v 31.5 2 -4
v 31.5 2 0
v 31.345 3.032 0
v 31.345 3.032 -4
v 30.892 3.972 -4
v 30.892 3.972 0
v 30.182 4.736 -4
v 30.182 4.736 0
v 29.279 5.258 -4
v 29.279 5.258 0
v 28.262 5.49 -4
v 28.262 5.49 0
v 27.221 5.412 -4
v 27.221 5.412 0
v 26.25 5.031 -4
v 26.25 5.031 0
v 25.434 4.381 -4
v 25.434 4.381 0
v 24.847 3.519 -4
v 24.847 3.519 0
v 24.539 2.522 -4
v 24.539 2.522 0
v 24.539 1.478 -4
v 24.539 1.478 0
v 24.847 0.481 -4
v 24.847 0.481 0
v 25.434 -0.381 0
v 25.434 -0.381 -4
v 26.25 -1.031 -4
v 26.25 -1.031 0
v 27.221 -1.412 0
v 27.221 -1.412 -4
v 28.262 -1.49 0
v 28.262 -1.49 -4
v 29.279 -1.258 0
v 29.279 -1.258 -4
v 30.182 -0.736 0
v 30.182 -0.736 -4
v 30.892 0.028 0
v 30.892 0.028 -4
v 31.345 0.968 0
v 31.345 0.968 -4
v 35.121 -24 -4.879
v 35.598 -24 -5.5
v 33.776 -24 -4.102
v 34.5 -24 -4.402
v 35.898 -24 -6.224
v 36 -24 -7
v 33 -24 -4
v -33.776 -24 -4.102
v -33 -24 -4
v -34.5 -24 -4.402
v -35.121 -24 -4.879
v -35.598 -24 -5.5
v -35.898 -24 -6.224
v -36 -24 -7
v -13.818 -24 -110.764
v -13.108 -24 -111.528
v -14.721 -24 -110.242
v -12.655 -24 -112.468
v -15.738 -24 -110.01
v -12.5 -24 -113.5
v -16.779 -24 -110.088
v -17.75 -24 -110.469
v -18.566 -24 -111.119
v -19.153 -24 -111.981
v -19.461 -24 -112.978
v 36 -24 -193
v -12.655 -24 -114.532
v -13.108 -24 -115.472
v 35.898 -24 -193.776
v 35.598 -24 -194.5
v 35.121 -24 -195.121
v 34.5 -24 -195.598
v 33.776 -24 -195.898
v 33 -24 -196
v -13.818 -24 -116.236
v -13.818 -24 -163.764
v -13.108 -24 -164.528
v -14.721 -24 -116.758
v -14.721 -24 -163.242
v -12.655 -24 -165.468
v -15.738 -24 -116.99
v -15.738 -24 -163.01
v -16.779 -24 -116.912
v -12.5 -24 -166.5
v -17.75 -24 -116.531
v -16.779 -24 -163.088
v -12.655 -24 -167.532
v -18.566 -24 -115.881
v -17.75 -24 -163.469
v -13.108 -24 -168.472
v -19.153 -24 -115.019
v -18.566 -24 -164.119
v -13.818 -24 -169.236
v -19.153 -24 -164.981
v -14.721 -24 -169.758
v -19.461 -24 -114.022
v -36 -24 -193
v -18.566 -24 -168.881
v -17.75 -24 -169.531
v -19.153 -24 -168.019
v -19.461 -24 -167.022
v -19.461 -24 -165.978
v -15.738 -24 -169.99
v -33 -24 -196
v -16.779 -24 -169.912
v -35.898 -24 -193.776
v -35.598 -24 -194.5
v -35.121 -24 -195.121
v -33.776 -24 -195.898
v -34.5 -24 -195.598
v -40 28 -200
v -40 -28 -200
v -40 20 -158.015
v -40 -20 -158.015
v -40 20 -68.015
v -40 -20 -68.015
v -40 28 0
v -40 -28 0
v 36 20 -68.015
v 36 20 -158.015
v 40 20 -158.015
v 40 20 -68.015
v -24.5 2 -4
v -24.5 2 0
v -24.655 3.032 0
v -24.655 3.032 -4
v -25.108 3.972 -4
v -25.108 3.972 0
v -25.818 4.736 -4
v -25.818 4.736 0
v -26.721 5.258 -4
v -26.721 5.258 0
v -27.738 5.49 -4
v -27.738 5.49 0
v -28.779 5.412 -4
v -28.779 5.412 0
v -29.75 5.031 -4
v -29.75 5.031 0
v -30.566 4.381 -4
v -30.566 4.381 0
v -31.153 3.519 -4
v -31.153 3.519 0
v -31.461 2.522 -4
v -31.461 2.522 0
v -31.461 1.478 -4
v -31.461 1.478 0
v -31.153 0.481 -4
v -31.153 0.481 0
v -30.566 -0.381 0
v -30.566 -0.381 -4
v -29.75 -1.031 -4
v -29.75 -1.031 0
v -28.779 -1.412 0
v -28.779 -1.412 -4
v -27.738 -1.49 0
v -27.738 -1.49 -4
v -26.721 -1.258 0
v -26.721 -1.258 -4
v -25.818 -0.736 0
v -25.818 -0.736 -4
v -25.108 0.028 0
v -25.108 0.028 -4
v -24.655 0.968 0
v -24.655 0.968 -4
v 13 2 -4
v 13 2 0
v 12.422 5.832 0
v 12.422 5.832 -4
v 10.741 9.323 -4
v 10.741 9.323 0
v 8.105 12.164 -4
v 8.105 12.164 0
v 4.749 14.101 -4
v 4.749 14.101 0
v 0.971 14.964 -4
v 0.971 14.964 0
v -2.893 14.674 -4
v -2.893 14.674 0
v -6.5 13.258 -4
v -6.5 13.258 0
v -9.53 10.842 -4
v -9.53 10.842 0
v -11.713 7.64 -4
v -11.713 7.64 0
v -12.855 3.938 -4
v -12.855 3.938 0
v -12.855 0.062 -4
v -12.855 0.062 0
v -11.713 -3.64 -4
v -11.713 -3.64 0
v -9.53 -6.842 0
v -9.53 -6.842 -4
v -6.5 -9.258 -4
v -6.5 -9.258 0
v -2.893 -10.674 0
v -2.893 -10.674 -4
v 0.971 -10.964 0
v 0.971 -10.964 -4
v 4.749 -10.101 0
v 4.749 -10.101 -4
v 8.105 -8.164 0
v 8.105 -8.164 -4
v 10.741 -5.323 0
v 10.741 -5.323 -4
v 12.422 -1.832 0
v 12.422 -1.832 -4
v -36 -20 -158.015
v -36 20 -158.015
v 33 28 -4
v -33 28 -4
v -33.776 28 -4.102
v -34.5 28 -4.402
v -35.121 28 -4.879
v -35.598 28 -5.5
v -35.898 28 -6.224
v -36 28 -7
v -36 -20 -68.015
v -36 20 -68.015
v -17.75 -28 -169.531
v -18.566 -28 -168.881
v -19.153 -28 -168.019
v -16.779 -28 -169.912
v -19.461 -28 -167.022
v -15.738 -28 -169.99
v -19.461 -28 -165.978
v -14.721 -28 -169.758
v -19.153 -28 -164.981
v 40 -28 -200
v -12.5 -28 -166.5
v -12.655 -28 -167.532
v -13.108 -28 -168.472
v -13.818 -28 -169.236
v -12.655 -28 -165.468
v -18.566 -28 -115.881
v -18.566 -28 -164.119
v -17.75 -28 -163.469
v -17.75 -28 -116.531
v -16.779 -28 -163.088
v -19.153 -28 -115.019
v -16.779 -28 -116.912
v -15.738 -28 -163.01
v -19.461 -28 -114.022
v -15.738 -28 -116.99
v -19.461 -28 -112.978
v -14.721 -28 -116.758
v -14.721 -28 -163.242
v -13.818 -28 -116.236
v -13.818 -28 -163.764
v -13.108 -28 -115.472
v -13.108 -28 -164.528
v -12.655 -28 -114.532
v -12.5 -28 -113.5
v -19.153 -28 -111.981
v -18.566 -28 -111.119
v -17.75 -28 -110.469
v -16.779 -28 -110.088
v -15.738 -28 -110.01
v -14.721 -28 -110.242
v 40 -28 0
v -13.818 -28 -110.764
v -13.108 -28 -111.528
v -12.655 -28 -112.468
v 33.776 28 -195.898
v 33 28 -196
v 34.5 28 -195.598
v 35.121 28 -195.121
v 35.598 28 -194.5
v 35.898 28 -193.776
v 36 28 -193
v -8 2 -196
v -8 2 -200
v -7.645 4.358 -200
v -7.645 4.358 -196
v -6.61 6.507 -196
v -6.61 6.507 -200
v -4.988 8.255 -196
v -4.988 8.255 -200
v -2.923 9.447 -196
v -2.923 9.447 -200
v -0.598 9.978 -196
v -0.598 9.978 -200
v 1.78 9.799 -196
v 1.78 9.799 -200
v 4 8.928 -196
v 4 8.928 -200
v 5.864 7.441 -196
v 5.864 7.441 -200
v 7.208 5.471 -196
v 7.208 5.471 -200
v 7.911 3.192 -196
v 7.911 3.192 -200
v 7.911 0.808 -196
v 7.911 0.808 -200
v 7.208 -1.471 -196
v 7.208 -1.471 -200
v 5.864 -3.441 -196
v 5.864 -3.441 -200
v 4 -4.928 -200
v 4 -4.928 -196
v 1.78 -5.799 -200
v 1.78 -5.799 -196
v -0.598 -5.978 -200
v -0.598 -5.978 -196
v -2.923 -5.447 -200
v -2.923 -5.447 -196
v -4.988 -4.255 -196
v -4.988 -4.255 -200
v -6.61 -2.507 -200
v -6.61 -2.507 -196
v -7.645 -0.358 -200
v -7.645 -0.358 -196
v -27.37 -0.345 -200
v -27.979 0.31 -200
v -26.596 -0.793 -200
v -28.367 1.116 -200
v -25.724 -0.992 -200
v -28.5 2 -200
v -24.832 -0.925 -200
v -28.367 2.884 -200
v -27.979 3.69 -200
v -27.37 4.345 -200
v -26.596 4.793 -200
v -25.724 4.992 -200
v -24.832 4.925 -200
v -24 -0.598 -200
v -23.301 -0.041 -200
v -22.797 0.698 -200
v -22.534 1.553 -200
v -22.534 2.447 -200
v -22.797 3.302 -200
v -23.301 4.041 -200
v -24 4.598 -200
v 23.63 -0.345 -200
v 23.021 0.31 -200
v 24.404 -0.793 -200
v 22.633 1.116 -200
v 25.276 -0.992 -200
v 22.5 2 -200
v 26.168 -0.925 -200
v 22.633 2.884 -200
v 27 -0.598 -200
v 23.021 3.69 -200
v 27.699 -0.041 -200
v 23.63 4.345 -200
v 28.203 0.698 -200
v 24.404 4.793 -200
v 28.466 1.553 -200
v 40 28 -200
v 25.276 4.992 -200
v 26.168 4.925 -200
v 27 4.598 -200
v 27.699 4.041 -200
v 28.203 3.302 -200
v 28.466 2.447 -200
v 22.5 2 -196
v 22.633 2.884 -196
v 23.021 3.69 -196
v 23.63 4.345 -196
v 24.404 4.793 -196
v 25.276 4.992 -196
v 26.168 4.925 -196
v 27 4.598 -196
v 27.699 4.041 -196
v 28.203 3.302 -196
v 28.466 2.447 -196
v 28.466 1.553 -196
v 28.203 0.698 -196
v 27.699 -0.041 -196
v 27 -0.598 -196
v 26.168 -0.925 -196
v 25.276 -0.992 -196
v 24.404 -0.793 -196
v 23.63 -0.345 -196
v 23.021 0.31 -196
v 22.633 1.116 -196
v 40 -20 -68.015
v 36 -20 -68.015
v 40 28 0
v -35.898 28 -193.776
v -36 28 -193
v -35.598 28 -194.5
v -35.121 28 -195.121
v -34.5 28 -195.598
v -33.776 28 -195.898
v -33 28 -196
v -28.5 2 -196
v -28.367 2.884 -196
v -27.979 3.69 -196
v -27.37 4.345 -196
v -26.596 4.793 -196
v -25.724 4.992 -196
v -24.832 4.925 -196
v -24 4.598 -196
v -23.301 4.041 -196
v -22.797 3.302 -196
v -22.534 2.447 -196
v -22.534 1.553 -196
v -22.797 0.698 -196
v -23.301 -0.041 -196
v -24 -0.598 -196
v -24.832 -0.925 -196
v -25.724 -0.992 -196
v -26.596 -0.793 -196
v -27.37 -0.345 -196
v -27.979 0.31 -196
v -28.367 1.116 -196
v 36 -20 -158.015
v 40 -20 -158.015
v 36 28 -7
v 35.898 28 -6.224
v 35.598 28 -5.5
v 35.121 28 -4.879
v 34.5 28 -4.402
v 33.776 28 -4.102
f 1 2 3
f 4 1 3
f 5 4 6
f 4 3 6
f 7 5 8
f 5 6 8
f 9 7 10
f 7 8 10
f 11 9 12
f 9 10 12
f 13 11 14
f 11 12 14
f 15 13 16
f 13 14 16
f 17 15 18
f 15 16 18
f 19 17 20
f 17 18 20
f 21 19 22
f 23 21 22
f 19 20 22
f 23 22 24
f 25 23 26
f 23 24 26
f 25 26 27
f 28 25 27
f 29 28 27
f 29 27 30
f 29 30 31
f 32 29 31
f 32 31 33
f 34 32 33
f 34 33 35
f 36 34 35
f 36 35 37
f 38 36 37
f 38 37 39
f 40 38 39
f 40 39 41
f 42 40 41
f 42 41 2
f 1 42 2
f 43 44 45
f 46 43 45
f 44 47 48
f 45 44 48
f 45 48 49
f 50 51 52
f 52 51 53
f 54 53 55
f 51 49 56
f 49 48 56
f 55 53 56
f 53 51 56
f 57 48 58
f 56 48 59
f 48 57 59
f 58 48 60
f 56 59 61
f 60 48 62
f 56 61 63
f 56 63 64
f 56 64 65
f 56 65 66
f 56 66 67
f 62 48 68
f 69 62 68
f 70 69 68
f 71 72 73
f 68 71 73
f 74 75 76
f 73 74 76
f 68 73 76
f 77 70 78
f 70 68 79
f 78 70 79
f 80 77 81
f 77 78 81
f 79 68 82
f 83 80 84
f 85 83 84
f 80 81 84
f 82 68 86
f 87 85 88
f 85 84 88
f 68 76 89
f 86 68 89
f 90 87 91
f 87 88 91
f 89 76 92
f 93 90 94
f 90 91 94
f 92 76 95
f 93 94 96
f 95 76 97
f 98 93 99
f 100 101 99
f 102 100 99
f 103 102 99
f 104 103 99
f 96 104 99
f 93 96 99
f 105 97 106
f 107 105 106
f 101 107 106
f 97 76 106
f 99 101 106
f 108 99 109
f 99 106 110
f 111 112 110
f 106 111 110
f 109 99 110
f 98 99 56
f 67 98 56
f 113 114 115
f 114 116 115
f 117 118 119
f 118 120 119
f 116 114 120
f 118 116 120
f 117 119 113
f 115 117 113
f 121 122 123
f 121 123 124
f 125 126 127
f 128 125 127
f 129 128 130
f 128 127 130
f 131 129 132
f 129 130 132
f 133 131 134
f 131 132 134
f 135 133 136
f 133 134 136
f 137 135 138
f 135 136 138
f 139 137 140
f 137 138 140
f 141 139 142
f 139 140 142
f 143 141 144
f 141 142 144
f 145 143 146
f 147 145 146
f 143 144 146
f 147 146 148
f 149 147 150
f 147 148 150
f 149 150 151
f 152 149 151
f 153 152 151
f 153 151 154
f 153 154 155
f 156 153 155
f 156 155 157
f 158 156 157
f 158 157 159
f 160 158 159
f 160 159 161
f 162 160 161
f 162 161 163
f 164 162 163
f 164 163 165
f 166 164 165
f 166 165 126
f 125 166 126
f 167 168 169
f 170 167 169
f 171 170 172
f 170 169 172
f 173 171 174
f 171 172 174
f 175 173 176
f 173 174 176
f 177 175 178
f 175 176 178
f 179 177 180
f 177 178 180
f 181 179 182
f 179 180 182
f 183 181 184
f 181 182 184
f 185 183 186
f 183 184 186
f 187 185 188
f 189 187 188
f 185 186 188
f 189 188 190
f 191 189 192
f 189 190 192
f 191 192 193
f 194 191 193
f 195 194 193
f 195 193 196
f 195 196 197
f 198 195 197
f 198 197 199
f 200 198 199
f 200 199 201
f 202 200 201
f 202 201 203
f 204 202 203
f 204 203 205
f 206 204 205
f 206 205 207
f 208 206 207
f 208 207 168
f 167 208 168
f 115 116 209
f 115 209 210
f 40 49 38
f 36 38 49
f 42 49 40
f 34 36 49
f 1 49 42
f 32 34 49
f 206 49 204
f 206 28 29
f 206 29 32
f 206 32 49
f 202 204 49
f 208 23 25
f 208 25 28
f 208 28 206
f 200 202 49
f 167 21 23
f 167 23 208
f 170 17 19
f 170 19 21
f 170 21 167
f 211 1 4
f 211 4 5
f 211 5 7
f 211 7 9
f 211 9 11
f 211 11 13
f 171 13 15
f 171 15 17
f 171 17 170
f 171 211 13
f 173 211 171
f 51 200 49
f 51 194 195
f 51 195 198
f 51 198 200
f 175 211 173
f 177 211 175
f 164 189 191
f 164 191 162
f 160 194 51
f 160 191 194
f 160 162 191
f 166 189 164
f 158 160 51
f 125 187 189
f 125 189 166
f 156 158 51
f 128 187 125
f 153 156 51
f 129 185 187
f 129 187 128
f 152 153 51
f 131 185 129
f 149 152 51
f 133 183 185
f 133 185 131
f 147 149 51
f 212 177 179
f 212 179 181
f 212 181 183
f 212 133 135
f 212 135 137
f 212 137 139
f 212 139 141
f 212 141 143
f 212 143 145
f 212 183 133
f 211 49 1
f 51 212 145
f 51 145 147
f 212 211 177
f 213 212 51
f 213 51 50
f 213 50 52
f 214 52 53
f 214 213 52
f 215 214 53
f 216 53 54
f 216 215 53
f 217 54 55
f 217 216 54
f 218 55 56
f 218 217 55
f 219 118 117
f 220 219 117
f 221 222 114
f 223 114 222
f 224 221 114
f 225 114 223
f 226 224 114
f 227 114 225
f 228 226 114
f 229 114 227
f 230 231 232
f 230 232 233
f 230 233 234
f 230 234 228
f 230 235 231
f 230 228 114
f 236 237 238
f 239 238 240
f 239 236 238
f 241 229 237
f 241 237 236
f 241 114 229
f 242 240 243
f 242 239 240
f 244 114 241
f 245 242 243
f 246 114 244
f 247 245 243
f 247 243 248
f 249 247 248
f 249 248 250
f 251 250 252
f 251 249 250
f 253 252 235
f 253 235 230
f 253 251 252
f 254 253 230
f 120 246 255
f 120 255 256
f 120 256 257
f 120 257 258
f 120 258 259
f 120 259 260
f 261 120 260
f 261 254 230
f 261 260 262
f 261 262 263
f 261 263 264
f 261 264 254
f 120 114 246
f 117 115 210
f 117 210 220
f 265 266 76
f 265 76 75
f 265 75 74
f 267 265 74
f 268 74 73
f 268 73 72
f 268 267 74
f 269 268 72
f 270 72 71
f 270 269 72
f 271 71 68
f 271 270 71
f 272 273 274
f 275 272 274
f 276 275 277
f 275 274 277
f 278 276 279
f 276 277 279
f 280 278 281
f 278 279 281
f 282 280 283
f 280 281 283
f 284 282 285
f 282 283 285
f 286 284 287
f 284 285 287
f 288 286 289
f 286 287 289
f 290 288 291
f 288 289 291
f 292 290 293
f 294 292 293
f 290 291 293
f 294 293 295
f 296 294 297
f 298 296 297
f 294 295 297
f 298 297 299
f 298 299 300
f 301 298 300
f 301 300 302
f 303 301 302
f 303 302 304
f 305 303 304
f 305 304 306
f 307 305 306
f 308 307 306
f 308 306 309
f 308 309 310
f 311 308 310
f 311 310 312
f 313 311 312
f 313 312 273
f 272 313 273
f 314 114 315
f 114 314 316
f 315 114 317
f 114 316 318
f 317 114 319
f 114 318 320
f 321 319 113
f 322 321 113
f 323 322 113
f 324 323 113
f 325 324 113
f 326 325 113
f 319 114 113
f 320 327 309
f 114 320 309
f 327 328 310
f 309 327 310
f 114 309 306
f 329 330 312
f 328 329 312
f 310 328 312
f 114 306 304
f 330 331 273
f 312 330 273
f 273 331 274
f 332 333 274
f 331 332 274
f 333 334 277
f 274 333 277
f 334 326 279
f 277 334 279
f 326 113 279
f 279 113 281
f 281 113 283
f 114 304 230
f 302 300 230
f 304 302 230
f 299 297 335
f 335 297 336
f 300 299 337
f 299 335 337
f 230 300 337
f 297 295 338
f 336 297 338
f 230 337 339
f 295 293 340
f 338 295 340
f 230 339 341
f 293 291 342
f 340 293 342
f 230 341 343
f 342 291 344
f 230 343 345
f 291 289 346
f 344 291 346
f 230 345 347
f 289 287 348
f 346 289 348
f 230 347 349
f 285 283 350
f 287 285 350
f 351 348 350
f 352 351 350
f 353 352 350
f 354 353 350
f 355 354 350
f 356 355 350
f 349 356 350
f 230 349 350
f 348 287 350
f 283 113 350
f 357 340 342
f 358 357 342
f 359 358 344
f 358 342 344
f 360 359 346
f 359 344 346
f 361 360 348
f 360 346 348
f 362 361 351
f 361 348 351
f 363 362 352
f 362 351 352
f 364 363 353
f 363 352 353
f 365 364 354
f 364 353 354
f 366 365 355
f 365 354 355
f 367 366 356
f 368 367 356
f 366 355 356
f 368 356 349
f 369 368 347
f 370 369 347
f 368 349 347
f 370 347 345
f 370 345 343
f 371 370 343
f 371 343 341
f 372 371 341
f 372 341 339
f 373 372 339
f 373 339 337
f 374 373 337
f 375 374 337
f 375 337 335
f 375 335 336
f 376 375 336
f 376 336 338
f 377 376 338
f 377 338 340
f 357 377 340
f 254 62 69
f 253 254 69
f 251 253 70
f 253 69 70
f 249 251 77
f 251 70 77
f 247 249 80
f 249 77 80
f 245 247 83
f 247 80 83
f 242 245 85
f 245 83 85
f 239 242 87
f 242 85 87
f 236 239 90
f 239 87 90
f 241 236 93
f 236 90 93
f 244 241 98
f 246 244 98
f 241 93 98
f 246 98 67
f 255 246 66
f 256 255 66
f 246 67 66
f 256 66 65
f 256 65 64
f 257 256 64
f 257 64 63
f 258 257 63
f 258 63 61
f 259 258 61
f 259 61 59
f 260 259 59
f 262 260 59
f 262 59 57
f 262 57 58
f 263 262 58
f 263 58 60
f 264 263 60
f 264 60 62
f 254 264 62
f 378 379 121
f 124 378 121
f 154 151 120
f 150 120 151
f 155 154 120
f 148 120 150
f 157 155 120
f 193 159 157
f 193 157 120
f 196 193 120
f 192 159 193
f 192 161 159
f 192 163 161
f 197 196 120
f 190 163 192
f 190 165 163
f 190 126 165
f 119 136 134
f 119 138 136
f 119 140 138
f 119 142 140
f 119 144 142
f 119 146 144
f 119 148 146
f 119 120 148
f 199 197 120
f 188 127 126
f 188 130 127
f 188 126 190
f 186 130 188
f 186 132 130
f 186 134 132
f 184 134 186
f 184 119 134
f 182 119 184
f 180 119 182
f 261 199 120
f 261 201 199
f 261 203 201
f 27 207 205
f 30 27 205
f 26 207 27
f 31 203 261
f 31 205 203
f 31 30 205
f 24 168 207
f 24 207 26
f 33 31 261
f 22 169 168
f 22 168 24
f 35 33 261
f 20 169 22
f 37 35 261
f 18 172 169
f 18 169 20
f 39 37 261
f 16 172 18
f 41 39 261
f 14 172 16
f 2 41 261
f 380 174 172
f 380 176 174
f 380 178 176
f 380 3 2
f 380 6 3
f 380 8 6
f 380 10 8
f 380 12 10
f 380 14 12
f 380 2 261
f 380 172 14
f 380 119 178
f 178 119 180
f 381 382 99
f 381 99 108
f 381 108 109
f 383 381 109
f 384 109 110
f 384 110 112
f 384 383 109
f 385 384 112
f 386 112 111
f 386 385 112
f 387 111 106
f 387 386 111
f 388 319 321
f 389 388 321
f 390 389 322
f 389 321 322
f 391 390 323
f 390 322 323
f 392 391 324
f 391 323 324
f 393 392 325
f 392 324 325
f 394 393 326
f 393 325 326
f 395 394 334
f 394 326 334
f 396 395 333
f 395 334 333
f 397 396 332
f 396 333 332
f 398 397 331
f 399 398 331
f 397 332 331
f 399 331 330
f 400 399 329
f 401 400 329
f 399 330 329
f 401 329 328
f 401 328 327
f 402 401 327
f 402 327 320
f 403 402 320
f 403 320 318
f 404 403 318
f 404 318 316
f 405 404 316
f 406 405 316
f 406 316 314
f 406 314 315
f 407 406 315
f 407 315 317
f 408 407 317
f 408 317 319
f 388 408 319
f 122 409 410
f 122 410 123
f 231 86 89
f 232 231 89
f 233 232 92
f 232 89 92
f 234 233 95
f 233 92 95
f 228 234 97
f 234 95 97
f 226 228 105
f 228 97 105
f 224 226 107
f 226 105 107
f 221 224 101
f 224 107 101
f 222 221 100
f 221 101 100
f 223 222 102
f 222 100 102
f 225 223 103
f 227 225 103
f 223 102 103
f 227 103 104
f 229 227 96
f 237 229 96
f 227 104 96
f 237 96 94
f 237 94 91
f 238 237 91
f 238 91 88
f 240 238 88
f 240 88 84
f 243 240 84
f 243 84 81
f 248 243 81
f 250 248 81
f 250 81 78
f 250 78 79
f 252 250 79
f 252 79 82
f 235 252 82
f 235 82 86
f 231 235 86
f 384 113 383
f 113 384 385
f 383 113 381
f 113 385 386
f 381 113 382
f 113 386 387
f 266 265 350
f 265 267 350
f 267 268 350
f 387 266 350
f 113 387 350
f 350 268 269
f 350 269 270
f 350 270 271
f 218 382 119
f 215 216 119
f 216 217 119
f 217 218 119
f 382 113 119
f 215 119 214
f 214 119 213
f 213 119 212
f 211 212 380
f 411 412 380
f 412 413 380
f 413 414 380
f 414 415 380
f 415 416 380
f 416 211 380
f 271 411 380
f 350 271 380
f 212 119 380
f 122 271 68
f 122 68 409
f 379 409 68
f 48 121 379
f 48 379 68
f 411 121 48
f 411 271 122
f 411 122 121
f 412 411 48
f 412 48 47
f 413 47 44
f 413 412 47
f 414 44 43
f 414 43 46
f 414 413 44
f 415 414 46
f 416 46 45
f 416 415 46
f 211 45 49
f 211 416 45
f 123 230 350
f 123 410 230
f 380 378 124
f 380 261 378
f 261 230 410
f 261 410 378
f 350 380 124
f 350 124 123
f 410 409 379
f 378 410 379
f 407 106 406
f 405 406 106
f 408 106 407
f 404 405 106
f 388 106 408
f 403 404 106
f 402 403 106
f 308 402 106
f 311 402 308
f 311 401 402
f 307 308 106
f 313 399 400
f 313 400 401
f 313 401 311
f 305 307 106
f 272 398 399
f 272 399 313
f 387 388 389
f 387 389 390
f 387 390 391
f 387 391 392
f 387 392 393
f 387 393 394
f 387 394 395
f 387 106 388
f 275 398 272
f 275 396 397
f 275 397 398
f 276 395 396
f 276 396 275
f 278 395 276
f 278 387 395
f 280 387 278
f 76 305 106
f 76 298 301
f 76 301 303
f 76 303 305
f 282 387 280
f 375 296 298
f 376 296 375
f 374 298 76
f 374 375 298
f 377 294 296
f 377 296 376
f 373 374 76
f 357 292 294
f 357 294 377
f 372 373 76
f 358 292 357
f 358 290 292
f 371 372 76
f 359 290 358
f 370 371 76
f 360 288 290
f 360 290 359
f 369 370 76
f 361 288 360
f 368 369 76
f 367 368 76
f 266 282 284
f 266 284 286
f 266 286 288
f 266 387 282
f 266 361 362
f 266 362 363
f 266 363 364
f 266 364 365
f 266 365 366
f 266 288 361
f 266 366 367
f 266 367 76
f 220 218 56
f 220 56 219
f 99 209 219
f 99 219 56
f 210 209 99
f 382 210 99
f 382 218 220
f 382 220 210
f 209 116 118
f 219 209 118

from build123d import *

# Parameters (mm, degrees)
SKETCH_1_W          = 80
SKETCH_1_H          = 56
EXTRUDE_1_DEPTH     = 200
CUT_EXTRUDE_1_DEPTH = 52
SKETCH_3_R          = 3.5
SKETCH_3_R_2        = 13
CUT_EXTRUDE_2_DEPTH = 10
SKETCH_5_R          = 8
SKETCH_5_R_2        = 3
CUT_EXTRUDE_4_DEPTH = 10
SKETCH_6_R          = 3.500000002
SKETCH_6_R_2        = 3.5
CUT_EXTRUDE_5_DEPTH = 10
SKETCH_7_W          = 90
SKETCH_7_H          = 40
CUT_EXTRUDE_6_DEPTH = 81


with BuildPart() as part:
    # 草图1 → 凸台-拉伸1 (new body)
    with BuildSketch(Plane.XY):
        Rectangle(SKETCH_1_W, SKETCH_1_H)
    extrude(amount=-EXTRUDE_1_DEPTH)

    # 草图2 → 切除-拉伸1 (cut)
    with BuildSketch(Plane(origin=(0, 28, 0), x_dir=(1, 0, 0), z_dir=(0, 1, 0))):
        with BuildLine():
            ThreePointArc((-36, 193), (-35.121320344, 195.121320344), (-33, 196))
            Line((-33, 196), (33, 196))
            ThreePointArc((33, 196), (35.121320344, 195.121320344), (36, 193))
            Line((36, 193), (36, 7))
            ThreePointArc((36, 7), (35.121320344, 4.878679656), (33, 4))
            Line((33, 4), (-33, 4))
            ThreePointArc((-33, 4), (-35.121320344, 4.878679656), (-36, 7))
            Line((-36, 7), (-36, 193))
        make_face()
    extrude(amount=-CUT_EXTRUDE_1_DEPTH, mode=Mode.SUBTRACT)

    # 草图3 → 切除-拉伸2 (cut)
    with BuildSketch(Plane.XY):
        with Locations((-28, 2)):
            Circle(SKETCH_3_R)
        with Locations((0, 2)):
            Circle(SKETCH_3_R_2)
        with Locations((28, 2)):
            Circle(SKETCH_3_R)
    extrude(amount=-CUT_EXTRUDE_2_DEPTH, mode=Mode.SUBTRACT)

    # 草图5 → 切除-拉伸4 (cut)
    with BuildSketch(Plane(origin=(0, 0, -200), x_dir=(-1, 0, 0), z_dir=(0, 0, -1))):
        with Locations((0, 2)):
            Circle(SKETCH_5_R)
        with Locations((25.5, 2)):
            Circle(SKETCH_5_R_2)
        with Locations((-25.5, 2)):
            Circle(SKETCH_5_R_2)
    extrude(amount=-CUT_EXTRUDE_4_DEPTH, mode=Mode.SUBTRACT)

    # 草图6 → 切除-拉伸5 (cut)
    with BuildSketch(Plane(origin=(0, -24, 0), x_dir=(1, 0, 0), z_dir=(0, 1, 0))):
        with Locations((-16, 166.5)):
            Circle(SKETCH_6_R)
        with Locations((-16, 113.5)):
            Circle(SKETCH_6_R_2)
    extrude(amount=-CUT_EXTRUDE_5_DEPTH, mode=Mode.SUBTRACT)

    # 草图7 → 切除-拉伸6 (cut, through all)
    with BuildSketch(Plane.ZY.offset(40)):
        with Locations((-113.014709347, 0)):
            Rectangle(SKETCH_7_W, SKETCH_7_H)
    extrude(amount=-CUT_EXTRUDE_6_DEPTH, mode=Mode.SUBTRACT)


solid = part.part
